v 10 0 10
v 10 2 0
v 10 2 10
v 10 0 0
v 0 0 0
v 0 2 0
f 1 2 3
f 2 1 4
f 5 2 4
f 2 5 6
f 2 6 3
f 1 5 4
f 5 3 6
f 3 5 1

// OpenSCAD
MEASURE_TO_BE_REWRITTEN = 10;

module base_curved(width, depth, height) {
    
    SLICE_HEIGHT = 0.5; // This value is the part we add to the sfere to be cutted. It's adjusted empirically
    
    difference() {
    
        difference() {
            resize(newsize=[width,depth,(height+SLICE_HEIGHT)*2])
                sphere(r=MEASURE_TO_BE_REWRITTEN);            

            translate( [0,0, width/2] ) 
                cube( size = width, center = true);
        }
    
        translate([0,0,-height/2 - height])
                    cube([width,depth,height],true);
    }
}

module base_spring_dock() {
    EXTERNAL_RADIUS = 7;
    INTERNAL_RADIUS = 6; 
    HEIGHT = 1;
    DISPLACEMENT = 1;
    difference() {
        translate([0,0,-1]) cylinder(h=HEIGHT+DISPLACEMENT,r=EXTERNAL_RADIUS);
        translate([0,0,-DISPLACEMENT]) cylinder(h=HEIGHT+2*DISPLACEMENT,r=INTERNAL_RADIUS);
    }
}

module piece() {
    
    BASE_WIDTH = 30;
    BASE_DEPTH = 16;
    BASE_CURVED_HEIGHT = 4;    // Height of the curved zone
    SHAFT_X = -5.2;              
    SHAFT_Y = -5.2;
    SHAFT_POSITION = [SHAFT_X,SHAFT_Y,0]; // Position of the shaft, relative to the center of the base
    
    base_curved(BASE_WIDTH,BASE_DEPTH,BASE_CURVED_HEIGHT);
    base_spring_dock();
    shaft(SHAFT_X,SHAFT_Y);
}



module shaft(x,y) {
    SHAFT_HEIGHT = 12;
    SHAFT_RADIUS = 1;
    
    translate([x,y,0])
        cylinder(r=SHAFT_RADIUS,h=SHAFT_HEIGHT,center=false);
}


module flap() {
    
    FLAP_HEIGHT = 10;
    FLAP_DEPTH = 2;
    MARGIN = 2;
    
    size = [FLAP_HEIGHT, FLAP_DEPTH , FLAP_HEIGHT];
    
    radio = sqrt(2*pow(FLAP_HEIGHT,2));
    
    difference() {
        
        cube(size);
        
        translate([0,-MARGIN,0]) // To avoid surface connection
            rotate([0,-45,0])
                cube(radio,false);
    }
}


module test() {
  flap();
}

module test2() {
    
    radio = 10;
    
    rotate([0,-45,0])
        cube(radio,false);
    
}


$fn=50;

//piece();
test();
//test2();
